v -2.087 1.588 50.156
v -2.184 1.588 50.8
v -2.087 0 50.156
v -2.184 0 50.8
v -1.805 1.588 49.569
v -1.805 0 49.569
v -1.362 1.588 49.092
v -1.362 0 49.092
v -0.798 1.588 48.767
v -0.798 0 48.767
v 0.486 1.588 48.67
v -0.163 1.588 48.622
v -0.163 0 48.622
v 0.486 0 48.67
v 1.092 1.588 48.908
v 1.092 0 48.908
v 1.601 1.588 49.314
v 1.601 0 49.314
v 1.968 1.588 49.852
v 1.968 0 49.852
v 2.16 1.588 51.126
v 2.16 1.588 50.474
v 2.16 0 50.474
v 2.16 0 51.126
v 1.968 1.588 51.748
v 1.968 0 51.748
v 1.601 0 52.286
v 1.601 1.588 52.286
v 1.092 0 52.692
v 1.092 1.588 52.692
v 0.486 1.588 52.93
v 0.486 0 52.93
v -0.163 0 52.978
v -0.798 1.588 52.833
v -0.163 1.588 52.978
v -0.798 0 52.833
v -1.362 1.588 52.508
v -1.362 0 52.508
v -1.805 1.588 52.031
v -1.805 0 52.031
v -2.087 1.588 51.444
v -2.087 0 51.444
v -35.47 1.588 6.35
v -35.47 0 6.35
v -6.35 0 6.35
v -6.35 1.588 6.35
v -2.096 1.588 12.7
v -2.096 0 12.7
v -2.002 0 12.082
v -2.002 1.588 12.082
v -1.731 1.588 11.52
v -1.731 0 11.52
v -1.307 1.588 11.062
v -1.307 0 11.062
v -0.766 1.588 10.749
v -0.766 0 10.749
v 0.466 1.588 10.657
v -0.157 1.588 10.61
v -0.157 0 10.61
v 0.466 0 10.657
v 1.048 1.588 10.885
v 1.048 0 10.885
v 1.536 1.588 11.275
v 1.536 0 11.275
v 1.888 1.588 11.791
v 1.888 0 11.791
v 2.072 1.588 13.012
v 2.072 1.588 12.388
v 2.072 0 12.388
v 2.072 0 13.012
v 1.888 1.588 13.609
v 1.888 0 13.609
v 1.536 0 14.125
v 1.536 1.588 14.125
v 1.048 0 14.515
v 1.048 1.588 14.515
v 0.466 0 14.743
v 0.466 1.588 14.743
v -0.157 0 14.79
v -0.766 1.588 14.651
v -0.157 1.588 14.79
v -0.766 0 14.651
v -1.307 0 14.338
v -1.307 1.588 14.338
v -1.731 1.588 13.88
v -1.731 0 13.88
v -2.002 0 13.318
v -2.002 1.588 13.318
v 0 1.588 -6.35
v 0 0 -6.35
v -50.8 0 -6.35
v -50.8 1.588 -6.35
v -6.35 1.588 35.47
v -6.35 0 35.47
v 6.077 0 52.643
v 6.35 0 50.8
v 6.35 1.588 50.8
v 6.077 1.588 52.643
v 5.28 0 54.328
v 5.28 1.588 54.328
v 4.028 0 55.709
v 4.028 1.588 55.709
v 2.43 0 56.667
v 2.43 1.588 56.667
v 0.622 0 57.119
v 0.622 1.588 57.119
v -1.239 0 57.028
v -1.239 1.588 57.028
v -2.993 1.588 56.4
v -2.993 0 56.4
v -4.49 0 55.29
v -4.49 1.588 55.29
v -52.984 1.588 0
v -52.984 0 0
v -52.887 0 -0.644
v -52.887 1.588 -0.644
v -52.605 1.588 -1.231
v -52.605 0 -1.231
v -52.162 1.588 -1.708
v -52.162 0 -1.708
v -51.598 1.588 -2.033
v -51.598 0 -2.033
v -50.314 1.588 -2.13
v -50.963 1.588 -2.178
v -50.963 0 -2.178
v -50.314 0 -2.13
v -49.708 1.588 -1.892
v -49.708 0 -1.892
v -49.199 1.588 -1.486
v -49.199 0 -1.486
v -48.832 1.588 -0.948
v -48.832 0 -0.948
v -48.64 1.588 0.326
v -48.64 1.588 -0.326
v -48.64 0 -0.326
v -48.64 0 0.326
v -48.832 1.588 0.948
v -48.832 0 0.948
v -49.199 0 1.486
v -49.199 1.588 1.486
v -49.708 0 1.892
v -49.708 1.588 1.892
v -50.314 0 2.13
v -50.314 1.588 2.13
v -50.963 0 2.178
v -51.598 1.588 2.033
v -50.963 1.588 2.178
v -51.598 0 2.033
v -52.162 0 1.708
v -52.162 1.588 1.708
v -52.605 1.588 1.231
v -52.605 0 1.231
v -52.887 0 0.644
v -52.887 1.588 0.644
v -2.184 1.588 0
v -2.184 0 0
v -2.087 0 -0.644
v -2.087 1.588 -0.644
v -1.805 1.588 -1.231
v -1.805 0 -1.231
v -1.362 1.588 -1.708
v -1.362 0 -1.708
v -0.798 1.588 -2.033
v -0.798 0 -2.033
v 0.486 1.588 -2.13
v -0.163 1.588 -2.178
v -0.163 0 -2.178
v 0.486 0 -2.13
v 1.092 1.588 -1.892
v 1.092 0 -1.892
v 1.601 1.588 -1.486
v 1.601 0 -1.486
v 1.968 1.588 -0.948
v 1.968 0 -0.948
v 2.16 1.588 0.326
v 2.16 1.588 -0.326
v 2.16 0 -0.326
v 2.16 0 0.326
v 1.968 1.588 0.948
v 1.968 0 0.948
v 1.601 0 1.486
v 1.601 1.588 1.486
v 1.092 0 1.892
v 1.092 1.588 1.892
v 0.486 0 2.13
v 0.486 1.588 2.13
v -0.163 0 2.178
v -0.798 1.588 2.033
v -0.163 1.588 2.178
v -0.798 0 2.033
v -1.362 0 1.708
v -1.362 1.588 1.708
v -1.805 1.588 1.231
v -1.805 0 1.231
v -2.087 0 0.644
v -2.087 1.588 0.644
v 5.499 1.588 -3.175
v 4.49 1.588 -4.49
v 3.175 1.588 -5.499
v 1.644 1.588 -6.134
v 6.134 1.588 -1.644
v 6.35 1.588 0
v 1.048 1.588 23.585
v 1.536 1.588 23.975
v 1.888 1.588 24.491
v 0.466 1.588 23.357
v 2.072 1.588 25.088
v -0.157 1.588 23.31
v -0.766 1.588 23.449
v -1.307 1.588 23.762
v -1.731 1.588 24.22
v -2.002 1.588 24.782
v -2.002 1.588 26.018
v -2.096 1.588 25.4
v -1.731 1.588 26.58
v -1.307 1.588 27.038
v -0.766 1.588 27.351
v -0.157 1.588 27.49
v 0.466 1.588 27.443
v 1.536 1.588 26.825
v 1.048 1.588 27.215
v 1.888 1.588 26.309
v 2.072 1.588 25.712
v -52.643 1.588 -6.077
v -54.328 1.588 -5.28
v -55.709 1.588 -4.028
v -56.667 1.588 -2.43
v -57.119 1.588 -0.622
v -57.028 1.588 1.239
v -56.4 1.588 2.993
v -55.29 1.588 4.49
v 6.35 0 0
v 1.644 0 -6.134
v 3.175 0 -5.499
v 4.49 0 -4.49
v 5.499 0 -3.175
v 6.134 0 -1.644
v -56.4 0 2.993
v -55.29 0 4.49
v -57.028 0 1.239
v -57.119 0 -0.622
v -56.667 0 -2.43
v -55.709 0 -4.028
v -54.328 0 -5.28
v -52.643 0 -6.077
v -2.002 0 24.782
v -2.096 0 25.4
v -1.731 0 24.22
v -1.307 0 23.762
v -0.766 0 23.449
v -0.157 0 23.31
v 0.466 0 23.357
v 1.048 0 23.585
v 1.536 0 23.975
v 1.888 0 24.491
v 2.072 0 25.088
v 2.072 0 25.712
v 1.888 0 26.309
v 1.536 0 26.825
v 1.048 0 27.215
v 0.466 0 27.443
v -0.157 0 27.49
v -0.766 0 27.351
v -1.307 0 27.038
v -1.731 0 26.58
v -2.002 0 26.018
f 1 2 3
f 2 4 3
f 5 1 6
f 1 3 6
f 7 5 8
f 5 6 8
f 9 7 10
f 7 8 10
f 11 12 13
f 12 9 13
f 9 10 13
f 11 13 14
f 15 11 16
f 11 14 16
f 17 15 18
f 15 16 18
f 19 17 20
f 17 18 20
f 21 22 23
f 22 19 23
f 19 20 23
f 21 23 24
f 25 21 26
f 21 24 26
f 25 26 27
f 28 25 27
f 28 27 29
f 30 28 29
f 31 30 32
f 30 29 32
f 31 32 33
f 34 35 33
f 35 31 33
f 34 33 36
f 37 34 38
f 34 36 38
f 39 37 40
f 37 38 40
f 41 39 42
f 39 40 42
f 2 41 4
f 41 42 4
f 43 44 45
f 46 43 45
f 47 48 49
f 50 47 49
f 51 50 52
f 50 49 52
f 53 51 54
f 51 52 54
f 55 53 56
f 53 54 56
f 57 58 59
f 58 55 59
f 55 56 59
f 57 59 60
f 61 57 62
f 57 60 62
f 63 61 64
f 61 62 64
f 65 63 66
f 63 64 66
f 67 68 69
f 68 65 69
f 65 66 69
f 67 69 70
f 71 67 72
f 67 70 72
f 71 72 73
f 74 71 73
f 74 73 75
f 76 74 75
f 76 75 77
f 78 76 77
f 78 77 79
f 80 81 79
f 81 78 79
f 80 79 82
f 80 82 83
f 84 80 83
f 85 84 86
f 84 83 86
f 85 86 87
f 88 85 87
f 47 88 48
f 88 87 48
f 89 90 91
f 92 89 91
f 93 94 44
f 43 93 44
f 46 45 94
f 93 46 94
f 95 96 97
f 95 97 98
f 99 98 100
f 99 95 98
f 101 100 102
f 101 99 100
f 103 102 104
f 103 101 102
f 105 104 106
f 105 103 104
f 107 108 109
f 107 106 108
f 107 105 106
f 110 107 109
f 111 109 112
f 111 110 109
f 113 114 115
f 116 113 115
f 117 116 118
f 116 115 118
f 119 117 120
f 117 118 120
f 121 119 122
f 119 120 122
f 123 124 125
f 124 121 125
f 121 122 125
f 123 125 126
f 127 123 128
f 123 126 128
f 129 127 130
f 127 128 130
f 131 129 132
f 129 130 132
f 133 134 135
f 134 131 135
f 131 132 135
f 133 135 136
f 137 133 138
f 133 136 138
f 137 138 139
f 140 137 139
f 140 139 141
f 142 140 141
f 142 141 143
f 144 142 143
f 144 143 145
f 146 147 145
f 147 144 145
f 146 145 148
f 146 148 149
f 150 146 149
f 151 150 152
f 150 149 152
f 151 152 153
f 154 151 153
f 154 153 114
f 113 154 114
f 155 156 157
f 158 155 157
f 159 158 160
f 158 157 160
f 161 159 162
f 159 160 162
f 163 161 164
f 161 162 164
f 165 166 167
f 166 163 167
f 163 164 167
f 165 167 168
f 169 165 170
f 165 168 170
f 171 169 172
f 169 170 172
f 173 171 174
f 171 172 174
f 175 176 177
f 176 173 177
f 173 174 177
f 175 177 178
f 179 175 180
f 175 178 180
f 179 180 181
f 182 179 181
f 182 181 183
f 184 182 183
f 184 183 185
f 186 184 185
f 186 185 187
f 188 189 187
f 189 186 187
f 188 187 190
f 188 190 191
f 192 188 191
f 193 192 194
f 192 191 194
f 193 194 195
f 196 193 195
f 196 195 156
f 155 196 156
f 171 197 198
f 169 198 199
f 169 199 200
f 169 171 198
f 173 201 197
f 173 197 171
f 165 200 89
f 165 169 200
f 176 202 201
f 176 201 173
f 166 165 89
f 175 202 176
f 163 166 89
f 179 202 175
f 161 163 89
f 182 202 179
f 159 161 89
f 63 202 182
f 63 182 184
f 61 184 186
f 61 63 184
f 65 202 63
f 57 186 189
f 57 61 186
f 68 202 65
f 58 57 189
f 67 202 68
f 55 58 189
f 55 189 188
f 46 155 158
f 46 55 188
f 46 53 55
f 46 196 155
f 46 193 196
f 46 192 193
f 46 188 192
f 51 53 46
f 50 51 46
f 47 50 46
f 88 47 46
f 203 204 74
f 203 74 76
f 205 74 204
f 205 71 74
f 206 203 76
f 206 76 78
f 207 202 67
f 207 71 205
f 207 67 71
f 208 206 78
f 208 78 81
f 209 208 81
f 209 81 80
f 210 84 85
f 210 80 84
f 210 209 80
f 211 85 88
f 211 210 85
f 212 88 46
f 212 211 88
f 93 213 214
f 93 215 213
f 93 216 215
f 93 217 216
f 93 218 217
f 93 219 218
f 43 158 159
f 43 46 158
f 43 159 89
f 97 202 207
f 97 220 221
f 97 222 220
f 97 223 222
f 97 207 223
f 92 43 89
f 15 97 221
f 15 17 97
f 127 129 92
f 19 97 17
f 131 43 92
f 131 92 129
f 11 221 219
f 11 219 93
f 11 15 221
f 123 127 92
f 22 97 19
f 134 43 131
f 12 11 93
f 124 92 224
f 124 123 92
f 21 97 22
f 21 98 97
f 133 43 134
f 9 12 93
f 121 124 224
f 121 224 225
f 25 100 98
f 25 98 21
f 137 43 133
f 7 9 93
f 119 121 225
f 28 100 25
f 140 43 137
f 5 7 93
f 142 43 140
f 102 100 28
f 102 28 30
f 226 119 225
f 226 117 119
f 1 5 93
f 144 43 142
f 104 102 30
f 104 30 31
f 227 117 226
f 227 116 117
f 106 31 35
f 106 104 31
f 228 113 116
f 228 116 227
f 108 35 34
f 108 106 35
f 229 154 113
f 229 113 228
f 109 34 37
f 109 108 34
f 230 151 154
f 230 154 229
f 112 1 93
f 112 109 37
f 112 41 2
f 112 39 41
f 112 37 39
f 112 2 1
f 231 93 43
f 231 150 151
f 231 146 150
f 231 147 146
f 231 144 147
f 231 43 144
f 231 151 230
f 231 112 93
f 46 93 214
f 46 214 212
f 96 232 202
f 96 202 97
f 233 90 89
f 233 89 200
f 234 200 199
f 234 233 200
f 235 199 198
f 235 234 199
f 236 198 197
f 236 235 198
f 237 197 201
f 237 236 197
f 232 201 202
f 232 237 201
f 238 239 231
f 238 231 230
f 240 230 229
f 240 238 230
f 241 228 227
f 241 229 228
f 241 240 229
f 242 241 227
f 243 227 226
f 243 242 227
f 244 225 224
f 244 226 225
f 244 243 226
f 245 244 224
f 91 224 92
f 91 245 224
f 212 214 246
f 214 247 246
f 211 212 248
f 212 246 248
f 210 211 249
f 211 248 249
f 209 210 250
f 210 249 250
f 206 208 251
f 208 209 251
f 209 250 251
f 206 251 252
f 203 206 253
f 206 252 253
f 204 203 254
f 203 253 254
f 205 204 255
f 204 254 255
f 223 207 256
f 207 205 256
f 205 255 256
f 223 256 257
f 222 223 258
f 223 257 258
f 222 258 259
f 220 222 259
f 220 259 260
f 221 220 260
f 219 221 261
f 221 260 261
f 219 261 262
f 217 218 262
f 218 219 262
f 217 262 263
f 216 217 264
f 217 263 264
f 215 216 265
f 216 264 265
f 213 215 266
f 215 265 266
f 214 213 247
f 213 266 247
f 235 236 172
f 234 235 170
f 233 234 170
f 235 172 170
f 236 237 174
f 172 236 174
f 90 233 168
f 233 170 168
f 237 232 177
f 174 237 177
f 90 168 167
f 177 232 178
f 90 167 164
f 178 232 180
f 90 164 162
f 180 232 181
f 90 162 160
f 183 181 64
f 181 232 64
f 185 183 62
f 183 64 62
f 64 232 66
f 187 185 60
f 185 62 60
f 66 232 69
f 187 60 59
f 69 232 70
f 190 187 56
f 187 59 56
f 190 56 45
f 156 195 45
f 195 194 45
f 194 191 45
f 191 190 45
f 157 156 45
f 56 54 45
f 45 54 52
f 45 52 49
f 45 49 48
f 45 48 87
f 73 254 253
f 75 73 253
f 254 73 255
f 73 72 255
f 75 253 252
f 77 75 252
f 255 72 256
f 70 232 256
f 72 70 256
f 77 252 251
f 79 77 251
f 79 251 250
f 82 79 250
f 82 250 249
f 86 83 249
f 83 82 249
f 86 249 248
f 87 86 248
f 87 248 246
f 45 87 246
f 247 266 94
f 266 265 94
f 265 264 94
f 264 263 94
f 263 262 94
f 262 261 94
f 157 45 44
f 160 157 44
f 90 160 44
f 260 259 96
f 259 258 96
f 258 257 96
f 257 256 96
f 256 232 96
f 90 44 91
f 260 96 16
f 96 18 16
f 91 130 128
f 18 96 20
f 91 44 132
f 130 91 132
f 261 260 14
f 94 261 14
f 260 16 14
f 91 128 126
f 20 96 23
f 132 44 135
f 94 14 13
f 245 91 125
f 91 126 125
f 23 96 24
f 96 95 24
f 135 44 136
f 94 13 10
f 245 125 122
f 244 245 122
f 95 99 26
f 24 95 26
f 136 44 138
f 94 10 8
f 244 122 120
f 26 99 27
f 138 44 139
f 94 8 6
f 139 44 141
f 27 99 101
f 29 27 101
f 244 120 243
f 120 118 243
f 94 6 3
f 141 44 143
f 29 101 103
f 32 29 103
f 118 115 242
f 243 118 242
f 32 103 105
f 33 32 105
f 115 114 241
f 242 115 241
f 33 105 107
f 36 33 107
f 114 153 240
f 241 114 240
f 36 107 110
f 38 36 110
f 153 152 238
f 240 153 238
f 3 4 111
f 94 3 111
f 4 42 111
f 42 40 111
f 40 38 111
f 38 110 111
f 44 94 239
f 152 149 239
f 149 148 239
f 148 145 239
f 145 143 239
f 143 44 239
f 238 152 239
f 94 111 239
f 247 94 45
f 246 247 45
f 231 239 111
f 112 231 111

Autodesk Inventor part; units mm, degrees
ref_plane "YZ Plane" through (0, 0, 0) normal (1, 0, 0) x (0, 1, 0)
ref_plane "XZ Plane" through (0, 0, 0) normal (0, 1, 0) x (-1, 0, 0)
ref_plane "XY Plane" through (0, 0, 0) normal (0, 0, 1) x (1, 0, 0)
sketch "main" plane through (0, 0, 0) normal (0, 0, 1) x (1, 0, 0)
  circle A0 centre (-25.7384, -24.2854) radius 2.1844
  circle A1 centre (-25.7384, 26.5146) radius 2.1844
  circle A2 centre (25.0616, -24.2854) radius 2.1844
  arc A3 (-32.0884, -24.2854) -> (-25.7384, -30.6354) centre (-25.7384, -24.2854) ccw
  arc A4 (25.0616, -30.6354) -> (29.5518, -19.7953) centre (25.0616, -24.2854) ccw
  arc A5 (-21.2482, 31.0047) -> (-32.0884, 26.5146) centre (-25.7384, 26.5146) ccw
  line L0 (-25.7384, -30.6354) -> (25.0616, -30.6354)
  line L1 (-32.0884, -24.2854) -> (-32.0884, 26.5146)
  line L2 (29.5518, -19.7953) -> (-21.2482, 31.0047)
  line L3 (-19.3884, 11.1843) -> (9.7314, -17.9354)
  line L4 (9.7314, -17.9354) -> (-19.3884, -17.9354)
  line L5 (-19.3884, -17.9354) -> (-19.3884, 11.1843)
  circle A6 centre (-25.7384, -11.5854) radius 2.0955
  circle A7 centre (-25.7384, 1.1146) radius 2.0955
  point P0 (-9.8909, -6.4767)
  point P1 (-28.0498, 28.318)
  dimension "d0" = 12.7
  dimension "d1" = 12.7
  dimension "d2" = 12.7
  dimension "d5" = 12.7
  dimension "d6" = 4.191
  dimension "d7" = 4.191
sketch "Sketch1" plane through (0, 0, 0) normal (0, 1, 0) x (-1, 0, 0)
  circle A0 centre (0, 0) radius 2.1844
  circle A1 centre (0, 50.8) radius 2.1844
  circle A2 centre (50.8, 0) radius 2.1844
  arc A3 (-6.35, 0) -> (0, -6.35) centre (0, 0) ccw
  arc A4 (50.8, -6.35) -> (55.2901, 4.4901) centre (50.8, 0) ccw
  arc A5 (4.4901, 55.2901) -> (-6.35, 50.8) centre (0, 50.8) ccw
  line L0 (0, -6.35) -> (50.8, -6.35)
  line L1 (-6.35, 0) -> (-6.35, 50.8)
  line L2 (55.2901, 4.4901) -> (4.4901, 55.2901)
  line L3 (6.35, 35.4697) -> (35.4697, 6.35)
  line L4 (35.4697, 6.35) -> (6.35, 6.35)
  line L5 (6.35, 6.35) -> (6.35, 35.4697)
  circle A6 centre (0, 12.7) radius 2.0955
  circle A7 centre (0, 25.4) radius 2.0955
extrude "Extrusion1" add sketch "Sketch1" along normal blind 1.5875
properties part number "triangle_gusset"
